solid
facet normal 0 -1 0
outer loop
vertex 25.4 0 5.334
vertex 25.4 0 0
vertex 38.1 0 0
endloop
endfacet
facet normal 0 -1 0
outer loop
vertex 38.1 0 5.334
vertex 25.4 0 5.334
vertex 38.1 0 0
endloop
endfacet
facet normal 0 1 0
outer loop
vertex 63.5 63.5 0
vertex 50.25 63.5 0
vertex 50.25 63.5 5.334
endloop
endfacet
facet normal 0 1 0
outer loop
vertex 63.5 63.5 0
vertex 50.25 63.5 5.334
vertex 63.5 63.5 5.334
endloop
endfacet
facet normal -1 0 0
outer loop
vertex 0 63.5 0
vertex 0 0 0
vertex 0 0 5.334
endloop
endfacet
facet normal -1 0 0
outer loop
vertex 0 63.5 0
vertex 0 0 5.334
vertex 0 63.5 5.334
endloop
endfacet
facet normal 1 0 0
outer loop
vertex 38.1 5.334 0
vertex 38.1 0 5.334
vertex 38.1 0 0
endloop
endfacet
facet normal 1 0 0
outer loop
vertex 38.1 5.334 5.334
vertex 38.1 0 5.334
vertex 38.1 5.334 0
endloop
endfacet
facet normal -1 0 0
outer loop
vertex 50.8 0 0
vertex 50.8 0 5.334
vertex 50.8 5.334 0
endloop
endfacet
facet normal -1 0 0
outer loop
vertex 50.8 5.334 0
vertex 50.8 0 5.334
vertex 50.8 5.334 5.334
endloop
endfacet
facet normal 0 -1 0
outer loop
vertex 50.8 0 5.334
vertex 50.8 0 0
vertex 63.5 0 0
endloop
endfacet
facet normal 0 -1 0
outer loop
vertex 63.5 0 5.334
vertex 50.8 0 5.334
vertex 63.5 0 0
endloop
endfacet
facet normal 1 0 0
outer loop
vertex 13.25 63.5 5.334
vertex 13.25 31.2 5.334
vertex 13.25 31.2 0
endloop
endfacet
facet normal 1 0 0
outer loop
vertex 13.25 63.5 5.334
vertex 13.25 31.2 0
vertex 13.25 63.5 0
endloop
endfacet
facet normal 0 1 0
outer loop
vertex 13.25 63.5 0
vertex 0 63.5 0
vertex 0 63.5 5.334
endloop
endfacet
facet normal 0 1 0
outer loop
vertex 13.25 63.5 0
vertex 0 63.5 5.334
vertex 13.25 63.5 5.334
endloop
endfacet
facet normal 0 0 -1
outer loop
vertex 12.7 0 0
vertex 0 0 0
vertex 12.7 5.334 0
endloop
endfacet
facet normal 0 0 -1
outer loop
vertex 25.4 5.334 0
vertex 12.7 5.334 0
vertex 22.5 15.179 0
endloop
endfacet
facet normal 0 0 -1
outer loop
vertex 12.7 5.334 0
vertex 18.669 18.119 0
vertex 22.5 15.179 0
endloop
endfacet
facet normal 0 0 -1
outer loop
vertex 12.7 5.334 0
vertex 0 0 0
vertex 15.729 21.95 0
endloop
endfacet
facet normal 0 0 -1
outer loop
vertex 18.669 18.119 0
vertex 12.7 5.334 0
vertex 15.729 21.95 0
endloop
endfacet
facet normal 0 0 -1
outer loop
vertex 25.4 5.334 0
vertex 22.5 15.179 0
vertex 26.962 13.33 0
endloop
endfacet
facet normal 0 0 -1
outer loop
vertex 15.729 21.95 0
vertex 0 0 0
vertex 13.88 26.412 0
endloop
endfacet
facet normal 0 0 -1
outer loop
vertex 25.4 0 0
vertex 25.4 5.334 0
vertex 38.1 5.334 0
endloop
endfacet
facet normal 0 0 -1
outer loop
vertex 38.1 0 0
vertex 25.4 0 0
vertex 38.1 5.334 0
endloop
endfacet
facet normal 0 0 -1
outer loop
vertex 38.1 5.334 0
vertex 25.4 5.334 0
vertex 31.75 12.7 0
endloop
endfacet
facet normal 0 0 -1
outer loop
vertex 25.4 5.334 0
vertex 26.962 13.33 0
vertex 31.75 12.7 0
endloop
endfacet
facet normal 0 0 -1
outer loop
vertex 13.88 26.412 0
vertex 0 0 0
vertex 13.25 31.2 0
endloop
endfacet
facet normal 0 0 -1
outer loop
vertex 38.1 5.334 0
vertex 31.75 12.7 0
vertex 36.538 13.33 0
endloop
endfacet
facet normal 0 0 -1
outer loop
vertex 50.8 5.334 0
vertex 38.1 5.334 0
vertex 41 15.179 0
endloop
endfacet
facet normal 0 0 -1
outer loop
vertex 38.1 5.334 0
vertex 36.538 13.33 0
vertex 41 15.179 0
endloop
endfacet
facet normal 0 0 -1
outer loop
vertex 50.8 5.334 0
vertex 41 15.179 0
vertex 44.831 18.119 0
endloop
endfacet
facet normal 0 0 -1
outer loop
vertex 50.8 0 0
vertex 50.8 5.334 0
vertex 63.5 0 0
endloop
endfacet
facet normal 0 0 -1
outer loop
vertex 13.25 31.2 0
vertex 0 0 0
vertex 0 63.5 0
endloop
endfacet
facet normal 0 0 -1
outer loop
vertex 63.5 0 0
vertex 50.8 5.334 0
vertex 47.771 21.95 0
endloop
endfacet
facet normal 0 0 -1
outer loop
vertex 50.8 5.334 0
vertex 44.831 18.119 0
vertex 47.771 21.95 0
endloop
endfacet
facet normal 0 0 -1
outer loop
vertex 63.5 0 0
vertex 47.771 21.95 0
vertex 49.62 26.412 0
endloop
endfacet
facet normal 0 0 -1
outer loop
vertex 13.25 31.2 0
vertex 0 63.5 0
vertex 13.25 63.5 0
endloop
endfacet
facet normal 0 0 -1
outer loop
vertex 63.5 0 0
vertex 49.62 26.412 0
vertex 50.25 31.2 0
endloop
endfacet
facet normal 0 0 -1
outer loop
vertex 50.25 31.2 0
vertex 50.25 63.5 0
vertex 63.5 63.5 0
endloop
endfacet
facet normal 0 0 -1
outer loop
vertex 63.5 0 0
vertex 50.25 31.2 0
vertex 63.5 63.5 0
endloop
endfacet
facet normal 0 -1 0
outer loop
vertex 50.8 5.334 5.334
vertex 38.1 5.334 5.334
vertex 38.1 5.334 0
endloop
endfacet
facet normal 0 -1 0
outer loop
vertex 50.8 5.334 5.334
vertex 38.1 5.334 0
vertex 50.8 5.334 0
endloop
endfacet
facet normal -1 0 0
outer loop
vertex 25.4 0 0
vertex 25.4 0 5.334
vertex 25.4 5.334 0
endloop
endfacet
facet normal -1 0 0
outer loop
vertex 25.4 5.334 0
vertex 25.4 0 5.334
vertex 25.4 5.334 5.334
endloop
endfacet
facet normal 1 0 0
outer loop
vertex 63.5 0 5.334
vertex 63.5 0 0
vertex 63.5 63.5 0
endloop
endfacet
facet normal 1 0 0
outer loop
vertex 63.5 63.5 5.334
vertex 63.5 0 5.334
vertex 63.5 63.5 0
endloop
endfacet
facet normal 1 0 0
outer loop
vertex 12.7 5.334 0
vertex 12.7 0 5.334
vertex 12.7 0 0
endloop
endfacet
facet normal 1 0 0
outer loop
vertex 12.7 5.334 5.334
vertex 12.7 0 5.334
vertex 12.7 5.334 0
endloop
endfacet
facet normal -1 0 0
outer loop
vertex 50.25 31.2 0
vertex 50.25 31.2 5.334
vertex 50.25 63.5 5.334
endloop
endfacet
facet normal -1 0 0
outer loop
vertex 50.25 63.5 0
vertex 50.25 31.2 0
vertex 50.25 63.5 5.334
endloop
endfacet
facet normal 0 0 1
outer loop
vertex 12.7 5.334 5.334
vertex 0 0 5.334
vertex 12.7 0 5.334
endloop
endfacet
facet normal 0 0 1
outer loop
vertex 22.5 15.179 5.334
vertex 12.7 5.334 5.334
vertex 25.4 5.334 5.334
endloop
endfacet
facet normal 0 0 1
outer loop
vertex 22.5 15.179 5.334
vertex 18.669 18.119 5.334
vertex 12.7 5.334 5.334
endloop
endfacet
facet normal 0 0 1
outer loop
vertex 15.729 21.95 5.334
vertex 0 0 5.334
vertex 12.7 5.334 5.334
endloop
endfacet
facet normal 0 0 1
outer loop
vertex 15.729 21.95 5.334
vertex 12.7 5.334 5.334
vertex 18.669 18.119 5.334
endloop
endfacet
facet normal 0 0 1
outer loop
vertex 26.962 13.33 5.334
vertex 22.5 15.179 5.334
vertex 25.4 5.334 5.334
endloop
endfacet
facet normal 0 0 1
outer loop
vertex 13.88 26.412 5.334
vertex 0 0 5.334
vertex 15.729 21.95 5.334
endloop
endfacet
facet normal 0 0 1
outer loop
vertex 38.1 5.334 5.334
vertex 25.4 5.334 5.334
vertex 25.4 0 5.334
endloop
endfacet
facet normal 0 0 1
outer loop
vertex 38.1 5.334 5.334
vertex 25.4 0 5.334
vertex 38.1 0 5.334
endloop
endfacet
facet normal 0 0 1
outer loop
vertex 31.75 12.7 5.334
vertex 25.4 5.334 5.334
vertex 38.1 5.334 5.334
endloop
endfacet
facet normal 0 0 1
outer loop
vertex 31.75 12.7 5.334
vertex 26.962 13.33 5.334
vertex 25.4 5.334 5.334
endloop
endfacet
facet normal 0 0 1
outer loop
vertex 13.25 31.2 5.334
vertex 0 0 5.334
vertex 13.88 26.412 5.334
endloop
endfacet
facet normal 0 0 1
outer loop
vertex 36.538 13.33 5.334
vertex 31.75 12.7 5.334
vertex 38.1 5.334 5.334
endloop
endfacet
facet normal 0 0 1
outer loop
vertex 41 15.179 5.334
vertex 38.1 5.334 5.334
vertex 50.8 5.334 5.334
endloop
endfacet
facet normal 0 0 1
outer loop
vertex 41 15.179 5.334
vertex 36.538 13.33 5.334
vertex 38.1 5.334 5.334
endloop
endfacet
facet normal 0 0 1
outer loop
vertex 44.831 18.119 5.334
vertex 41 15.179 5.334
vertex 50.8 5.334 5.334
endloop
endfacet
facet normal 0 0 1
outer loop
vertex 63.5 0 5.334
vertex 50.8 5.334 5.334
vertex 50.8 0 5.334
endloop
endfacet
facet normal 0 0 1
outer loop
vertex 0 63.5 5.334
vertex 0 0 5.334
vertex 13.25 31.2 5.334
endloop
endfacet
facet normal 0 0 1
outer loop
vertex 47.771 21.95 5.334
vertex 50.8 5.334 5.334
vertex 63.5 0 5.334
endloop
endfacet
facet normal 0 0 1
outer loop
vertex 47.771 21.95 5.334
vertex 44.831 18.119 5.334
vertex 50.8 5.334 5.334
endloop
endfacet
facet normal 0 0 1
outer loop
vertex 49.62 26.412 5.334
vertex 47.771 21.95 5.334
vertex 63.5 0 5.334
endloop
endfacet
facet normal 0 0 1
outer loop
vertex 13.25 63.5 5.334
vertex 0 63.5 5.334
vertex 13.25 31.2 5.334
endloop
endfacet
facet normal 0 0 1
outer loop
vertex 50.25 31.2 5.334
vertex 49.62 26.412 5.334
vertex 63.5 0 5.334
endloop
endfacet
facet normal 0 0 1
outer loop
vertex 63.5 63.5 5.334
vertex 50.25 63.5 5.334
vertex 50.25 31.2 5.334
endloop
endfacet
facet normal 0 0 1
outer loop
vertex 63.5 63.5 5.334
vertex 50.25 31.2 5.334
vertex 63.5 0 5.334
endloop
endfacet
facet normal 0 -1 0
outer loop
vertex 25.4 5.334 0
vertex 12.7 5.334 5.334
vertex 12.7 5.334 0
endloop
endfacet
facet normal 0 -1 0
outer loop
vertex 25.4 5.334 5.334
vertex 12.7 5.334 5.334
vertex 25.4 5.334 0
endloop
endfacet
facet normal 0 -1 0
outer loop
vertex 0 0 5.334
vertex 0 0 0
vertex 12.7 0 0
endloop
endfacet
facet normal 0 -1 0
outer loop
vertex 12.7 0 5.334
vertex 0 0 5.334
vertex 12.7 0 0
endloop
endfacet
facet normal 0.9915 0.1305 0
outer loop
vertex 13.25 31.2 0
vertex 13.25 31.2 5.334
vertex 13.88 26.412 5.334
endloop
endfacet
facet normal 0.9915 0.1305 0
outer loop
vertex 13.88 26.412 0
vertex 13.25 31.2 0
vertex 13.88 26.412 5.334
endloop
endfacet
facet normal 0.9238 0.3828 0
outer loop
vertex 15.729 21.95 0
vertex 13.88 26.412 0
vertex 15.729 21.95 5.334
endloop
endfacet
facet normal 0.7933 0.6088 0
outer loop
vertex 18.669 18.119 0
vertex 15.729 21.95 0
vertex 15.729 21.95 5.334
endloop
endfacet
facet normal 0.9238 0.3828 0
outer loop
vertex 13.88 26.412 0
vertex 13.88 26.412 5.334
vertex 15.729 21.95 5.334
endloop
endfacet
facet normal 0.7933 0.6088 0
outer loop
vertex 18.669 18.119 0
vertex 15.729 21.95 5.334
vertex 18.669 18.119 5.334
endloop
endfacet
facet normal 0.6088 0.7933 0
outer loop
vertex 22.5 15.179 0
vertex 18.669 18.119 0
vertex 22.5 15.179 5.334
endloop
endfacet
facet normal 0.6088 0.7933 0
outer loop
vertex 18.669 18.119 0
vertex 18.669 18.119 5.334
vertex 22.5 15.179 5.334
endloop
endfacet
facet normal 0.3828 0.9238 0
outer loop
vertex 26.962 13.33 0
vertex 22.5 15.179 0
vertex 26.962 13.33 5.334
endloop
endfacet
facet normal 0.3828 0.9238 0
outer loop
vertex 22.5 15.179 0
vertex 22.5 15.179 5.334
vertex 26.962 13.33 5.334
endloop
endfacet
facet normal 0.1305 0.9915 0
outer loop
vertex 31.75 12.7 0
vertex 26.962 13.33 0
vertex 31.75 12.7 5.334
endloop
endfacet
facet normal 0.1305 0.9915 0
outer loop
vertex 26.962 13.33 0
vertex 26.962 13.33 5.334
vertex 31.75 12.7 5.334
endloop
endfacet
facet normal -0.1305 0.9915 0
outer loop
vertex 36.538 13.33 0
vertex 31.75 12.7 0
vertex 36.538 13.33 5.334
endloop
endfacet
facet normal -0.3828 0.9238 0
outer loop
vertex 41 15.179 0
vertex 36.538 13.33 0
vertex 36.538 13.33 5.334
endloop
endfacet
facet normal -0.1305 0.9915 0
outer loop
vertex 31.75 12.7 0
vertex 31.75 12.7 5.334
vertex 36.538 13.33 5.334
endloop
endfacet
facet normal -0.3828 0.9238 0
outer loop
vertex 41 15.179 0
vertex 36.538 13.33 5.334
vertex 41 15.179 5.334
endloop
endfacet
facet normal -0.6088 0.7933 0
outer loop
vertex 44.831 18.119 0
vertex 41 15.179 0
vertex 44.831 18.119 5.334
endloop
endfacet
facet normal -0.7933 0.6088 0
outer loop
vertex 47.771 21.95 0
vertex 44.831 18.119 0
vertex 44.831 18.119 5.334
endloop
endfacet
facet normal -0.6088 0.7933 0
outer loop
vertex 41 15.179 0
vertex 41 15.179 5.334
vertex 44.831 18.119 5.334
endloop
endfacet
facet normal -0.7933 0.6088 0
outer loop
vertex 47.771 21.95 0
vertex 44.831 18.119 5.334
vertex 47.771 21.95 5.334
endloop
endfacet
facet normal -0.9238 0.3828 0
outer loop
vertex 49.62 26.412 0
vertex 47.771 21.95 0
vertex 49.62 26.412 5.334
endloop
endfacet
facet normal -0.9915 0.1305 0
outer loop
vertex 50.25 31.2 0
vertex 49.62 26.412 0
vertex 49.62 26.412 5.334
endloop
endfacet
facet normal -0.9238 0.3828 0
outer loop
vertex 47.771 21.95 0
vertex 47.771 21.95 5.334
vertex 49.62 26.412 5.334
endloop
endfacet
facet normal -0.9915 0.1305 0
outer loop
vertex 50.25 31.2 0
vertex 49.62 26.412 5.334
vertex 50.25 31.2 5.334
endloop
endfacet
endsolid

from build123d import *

# Parameters (mm, degrees)
SKETCH1_W           = 63.5
SKETCH1_H           = 63.5
BOSS_EXTRUDE1_DEPTH = 5.334
SKETCH2_R           = 18.5
SKETCH2_W           = 12.7
SKETCH2_H           = 5.334
CUT_EXTRUDE1_DEPTH  = 5.334
SKETCH3_W           = 37
SKETCH3_H           = 32.300000043
CUT_EXTRUDE2_DEPTH  = 5.334


with BuildPart() as part:
    # Sketch1 → Boss-Extrude1 (new body)
    with BuildSketch(Plane.XY):
        with Locations((31.75, 31.75)):
            Rectangle(SKETCH1_W, SKETCH1_H)
    extrude(amount=BOSS_EXTRUDE1_DEPTH)

    # Sketch2 → Cut-Extrude1 (cut)
    with BuildSketch(Plane.XY.offset(5.334)):
        with Locations((31.75, 31.199999957)):
            Circle(SKETCH2_R)
        with Locations((19.05, 2.667)):
            Rectangle(SKETCH2_W, SKETCH2_H)
        with Locations((44.45, 2.667)):
            Rectangle(SKETCH2_W, SKETCH2_H)
    extrude(amount=-CUT_EXTRUDE1_DEPTH, mode=Mode.SUBTRACT)

    # Sketch3 → Cut-Extrude2 (cut)
    with BuildSketch(Plane.XY.offset(5.334)):
        with Locations((31.75, 47.349999979)):
            Rectangle(SKETCH3_W, SKETCH3_H)
    extrude(amount=-CUT_EXTRUDE2_DEPTH, mode=Mode.SUBTRACT)


solid = part.part
